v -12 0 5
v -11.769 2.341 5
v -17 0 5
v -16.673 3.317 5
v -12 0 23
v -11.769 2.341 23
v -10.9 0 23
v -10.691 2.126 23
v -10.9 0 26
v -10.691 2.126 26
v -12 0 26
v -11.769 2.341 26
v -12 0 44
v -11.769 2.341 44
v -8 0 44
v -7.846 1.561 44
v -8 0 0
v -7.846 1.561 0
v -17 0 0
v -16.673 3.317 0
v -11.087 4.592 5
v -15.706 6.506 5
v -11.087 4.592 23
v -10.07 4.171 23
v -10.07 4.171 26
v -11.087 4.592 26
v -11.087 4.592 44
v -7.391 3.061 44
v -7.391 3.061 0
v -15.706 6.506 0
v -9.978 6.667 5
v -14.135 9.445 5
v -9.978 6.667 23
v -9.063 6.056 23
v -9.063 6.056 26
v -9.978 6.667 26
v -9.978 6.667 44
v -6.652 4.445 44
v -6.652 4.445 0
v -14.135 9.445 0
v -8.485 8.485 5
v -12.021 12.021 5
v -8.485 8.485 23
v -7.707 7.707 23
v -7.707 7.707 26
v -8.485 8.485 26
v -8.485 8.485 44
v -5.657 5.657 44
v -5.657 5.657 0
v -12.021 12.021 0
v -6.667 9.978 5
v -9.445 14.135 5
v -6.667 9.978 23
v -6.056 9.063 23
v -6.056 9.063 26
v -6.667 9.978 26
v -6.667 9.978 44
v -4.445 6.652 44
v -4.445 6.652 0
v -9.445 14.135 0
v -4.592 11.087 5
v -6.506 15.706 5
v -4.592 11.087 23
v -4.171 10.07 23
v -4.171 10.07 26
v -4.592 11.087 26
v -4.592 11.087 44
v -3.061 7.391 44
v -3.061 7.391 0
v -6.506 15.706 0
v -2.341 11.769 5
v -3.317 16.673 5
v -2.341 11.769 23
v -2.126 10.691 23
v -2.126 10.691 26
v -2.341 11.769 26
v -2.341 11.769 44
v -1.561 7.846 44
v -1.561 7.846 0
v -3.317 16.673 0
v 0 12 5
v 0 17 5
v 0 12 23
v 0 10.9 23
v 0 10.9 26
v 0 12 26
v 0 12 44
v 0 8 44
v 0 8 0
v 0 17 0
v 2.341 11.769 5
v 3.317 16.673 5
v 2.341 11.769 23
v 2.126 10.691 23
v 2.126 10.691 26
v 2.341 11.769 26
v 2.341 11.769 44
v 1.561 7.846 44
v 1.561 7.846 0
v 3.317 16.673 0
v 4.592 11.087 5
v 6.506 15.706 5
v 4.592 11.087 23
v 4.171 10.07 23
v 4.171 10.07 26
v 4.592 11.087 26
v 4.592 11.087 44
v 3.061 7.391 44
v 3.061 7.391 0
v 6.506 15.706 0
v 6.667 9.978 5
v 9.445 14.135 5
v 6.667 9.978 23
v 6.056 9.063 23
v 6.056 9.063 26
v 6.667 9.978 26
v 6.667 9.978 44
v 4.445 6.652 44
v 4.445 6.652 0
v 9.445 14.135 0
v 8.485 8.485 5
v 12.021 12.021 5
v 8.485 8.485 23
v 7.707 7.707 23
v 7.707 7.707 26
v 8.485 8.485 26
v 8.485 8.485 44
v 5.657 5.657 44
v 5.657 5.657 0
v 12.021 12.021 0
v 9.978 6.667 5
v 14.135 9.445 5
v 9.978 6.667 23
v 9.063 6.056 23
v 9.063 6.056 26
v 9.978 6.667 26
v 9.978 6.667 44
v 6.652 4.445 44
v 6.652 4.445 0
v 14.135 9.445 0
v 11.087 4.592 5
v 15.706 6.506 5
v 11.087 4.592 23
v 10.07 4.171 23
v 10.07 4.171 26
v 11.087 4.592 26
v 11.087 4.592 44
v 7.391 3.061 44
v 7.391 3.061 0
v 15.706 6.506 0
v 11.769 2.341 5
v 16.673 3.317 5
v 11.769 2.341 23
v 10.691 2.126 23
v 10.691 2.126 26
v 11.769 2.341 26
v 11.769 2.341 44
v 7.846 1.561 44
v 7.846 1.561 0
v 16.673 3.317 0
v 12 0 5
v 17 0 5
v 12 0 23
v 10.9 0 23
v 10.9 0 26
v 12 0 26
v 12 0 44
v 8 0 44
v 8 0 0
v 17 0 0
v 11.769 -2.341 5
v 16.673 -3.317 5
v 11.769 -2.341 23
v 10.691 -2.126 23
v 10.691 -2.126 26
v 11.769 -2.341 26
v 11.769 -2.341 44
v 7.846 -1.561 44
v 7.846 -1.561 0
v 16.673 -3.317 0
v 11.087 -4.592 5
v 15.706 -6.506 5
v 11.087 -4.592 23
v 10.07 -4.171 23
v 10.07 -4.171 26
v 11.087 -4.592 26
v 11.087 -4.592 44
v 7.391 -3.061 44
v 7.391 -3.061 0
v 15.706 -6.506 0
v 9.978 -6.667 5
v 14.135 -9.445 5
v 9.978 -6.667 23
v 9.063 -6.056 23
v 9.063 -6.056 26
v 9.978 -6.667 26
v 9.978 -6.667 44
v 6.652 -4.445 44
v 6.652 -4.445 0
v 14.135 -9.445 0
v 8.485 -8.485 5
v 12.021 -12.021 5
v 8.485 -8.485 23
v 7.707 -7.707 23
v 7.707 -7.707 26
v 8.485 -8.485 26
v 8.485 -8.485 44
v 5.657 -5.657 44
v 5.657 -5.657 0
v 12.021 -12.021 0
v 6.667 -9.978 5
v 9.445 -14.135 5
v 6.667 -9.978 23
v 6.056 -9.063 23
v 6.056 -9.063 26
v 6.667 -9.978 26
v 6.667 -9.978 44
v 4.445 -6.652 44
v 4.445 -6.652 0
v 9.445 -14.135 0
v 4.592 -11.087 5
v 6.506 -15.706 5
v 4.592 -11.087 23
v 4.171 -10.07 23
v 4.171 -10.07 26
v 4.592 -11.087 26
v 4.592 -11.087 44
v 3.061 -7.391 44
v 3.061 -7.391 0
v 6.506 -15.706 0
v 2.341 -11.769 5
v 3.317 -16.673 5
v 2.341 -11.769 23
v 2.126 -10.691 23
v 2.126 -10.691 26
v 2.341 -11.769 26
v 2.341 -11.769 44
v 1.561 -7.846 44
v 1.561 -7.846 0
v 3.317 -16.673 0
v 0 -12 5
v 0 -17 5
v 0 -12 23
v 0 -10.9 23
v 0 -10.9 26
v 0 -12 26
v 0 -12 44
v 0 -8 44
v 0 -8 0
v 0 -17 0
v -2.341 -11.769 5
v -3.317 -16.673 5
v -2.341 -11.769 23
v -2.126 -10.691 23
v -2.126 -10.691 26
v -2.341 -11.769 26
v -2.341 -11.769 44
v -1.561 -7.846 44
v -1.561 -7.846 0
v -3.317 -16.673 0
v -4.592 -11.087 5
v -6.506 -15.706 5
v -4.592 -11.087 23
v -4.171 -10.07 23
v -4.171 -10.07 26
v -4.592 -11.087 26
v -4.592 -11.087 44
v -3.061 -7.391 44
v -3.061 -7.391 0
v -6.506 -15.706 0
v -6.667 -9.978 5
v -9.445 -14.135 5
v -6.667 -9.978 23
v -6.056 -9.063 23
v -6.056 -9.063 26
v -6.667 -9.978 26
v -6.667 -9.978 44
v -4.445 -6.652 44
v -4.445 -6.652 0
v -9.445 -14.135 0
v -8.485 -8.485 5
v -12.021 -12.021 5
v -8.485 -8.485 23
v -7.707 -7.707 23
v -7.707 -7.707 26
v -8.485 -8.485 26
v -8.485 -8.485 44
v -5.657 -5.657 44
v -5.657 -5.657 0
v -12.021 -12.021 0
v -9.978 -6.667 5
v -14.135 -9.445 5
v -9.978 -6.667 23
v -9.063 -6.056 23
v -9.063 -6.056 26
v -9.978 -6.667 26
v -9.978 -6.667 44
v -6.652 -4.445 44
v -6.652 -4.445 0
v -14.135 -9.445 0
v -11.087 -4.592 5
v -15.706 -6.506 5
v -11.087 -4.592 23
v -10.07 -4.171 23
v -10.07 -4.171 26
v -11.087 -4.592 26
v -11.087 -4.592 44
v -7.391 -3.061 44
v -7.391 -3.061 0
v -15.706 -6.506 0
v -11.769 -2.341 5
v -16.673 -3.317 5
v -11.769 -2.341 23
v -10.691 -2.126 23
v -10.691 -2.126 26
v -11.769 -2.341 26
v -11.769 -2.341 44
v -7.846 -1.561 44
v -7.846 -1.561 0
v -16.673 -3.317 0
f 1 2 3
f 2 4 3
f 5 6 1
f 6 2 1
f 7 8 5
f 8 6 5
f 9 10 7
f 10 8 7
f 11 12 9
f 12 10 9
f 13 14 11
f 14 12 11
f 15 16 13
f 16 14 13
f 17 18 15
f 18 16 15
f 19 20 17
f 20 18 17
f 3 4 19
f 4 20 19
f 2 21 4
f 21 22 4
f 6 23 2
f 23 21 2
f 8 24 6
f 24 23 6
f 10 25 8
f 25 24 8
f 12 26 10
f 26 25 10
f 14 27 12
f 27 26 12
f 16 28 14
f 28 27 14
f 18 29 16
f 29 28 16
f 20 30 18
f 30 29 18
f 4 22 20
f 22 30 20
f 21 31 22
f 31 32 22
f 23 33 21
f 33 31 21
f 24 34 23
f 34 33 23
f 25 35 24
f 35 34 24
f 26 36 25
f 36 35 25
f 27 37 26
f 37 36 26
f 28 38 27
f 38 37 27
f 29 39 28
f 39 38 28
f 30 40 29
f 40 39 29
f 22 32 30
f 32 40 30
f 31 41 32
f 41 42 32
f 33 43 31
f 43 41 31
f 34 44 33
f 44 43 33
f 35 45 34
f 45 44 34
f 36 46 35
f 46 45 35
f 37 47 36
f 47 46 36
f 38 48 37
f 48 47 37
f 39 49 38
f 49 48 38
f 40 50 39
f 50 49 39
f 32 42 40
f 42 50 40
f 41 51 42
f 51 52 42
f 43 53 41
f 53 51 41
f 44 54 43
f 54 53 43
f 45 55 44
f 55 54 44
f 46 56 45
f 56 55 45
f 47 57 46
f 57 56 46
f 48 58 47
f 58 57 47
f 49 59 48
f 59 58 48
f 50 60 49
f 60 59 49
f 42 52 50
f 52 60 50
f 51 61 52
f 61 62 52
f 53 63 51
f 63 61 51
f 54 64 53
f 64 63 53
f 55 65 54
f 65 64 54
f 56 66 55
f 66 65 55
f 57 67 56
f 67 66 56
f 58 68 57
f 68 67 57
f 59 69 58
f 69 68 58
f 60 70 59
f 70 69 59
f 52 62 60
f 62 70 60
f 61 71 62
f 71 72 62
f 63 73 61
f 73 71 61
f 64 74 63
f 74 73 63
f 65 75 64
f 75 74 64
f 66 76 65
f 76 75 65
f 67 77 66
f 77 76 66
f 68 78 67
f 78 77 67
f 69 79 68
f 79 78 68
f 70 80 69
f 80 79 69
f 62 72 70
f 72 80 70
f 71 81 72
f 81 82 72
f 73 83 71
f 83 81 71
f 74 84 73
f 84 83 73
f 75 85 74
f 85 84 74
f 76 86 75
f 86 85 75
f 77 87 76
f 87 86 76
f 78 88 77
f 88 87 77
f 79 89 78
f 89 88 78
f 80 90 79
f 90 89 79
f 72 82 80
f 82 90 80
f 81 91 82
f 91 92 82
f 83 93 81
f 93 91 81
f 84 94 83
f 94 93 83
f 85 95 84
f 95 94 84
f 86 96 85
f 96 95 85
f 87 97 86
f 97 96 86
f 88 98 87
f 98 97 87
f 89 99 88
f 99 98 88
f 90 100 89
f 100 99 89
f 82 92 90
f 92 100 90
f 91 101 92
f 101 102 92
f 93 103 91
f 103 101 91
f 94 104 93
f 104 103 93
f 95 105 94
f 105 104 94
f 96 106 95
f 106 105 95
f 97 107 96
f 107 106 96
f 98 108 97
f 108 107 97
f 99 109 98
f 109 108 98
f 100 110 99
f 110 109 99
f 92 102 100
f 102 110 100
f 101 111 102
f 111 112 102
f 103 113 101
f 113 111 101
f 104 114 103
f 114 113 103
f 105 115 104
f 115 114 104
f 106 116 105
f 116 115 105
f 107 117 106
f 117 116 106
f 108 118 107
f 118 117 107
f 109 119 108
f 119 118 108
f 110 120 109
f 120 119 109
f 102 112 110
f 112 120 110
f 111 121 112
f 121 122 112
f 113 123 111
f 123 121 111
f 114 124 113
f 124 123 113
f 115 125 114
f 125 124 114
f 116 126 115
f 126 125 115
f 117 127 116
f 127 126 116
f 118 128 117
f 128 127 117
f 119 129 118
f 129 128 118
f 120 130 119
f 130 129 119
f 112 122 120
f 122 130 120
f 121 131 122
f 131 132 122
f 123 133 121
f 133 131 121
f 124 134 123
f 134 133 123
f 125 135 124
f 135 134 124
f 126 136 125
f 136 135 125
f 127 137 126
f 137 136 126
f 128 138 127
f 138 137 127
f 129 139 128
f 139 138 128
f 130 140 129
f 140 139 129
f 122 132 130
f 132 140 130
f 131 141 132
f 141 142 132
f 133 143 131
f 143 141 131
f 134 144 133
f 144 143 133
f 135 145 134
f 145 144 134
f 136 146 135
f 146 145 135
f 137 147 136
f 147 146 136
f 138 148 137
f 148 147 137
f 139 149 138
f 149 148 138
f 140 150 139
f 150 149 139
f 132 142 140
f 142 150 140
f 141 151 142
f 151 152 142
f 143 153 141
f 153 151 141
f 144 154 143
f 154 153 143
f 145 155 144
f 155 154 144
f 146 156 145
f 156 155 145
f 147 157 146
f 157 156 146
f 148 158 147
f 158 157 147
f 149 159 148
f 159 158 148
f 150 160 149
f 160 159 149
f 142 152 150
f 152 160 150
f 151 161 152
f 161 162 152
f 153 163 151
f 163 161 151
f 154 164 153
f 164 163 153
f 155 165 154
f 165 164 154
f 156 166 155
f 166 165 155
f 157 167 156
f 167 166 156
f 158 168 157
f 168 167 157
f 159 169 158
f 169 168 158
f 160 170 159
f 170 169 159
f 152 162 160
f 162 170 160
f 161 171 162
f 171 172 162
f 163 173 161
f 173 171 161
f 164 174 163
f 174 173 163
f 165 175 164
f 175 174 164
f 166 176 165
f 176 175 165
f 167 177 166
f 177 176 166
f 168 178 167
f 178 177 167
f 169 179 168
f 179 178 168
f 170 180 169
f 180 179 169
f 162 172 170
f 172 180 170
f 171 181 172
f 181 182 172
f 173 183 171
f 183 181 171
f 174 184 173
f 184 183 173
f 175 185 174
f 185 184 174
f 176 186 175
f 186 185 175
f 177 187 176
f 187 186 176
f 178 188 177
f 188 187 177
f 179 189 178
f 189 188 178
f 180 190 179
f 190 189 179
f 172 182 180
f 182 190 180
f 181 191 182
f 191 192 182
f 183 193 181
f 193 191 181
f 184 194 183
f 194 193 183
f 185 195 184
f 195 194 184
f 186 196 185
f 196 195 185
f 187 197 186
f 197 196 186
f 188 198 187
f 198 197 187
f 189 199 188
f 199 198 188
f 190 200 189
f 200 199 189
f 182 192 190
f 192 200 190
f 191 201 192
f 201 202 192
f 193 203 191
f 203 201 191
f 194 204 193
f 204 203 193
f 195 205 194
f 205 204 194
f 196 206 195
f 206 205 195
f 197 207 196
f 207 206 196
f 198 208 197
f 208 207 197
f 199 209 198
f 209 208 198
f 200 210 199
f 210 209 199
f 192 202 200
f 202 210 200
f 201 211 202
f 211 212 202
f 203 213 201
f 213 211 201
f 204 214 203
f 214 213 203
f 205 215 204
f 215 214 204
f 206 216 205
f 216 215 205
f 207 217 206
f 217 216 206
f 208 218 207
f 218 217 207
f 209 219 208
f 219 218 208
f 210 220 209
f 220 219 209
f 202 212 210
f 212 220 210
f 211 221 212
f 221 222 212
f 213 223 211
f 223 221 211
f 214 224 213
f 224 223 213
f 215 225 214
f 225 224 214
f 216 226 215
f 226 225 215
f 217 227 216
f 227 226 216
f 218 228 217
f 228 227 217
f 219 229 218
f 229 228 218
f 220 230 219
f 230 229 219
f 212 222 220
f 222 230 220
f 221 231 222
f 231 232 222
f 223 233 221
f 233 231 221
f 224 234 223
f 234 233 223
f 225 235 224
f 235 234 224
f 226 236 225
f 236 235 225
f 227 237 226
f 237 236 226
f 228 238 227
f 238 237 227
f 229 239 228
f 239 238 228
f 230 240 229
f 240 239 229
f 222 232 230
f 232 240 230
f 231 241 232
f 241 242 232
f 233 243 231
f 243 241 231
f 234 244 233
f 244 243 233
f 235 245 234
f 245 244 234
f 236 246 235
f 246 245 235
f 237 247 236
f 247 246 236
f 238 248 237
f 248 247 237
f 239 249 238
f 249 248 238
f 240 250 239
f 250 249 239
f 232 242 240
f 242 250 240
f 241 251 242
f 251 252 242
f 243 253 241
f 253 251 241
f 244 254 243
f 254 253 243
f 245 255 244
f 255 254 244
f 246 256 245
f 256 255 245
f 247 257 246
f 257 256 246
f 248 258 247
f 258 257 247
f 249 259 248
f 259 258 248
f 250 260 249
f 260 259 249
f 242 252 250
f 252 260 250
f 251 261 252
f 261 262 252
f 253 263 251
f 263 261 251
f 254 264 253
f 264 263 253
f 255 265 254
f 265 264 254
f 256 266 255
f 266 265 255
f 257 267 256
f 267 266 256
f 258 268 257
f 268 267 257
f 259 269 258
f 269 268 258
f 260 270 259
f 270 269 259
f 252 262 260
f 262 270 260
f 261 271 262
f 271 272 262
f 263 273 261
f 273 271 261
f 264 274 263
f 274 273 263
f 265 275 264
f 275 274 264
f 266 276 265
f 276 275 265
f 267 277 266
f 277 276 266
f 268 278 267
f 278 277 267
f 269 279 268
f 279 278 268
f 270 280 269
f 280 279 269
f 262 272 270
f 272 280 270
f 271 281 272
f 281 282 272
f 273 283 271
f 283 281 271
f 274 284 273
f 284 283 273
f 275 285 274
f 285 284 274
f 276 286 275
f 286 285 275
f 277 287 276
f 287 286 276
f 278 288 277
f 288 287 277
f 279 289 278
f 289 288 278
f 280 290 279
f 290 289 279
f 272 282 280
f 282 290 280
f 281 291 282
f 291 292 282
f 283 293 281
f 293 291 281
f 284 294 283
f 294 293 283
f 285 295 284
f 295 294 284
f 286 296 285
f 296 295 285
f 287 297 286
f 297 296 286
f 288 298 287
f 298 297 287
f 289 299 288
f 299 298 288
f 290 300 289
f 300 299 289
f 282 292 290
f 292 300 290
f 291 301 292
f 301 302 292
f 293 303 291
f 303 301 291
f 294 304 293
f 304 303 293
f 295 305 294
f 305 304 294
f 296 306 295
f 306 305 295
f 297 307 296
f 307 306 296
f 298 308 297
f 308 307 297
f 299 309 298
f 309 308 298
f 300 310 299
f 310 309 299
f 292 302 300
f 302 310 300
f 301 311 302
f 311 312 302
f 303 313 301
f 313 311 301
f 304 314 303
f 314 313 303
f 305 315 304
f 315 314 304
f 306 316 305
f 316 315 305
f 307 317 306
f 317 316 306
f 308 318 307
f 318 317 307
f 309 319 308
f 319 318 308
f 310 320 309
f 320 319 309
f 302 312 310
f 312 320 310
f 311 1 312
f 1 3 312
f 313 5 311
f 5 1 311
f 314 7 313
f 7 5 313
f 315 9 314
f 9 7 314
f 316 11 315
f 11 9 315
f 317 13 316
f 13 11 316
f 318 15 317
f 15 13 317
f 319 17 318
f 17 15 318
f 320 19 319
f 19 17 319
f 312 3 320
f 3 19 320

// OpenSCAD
$fn = 32;

// ----------------------------------------------------------------------
// Grooved revolve: flanged, bore R8
// ----------------------------------------------------------------------

// --- parameters (mm) ---
bore_r = 8;               // bore radius
outer_r = 12;             // outer radius of the body
total_h = 44;             // overall height, Z
wall = 4;                 // radial wall thickness
groove_w = 3;             // groove width
groove_d = 1.1;           // groove depth
grooves = 1;              // number of outer grooves
flange_r = 17;            // flange radius
flange_h = 5;             // flange height
fit_tol = 0.1;            // declared fit tolerance (prompt contract)
free_tol = 0.5;           // declared free tolerance (prompt contract)

bbox_x = 2 * flange_r;  // full diameter
bore_d = 2 * bore_r;  // bore diameter
body_d = 2 * outer_r;  // body diameter
flange_d = 2 * flange_r;  // flange diameter
revolve_angle = 360;  // full turn around the Z axis

profile = [[8, 0], [12, 0], [17, 0], [17, 5], [12, 5], [12, 23], [10.9, 23], [10.9, 26], [12, 26], [12, 44], [8, 44]];  // primary outline, 11 points, counter clockwise

// --- the one profile operation ---
rotate_extrude(angle = revolve_angle) polygon(points = profile);
